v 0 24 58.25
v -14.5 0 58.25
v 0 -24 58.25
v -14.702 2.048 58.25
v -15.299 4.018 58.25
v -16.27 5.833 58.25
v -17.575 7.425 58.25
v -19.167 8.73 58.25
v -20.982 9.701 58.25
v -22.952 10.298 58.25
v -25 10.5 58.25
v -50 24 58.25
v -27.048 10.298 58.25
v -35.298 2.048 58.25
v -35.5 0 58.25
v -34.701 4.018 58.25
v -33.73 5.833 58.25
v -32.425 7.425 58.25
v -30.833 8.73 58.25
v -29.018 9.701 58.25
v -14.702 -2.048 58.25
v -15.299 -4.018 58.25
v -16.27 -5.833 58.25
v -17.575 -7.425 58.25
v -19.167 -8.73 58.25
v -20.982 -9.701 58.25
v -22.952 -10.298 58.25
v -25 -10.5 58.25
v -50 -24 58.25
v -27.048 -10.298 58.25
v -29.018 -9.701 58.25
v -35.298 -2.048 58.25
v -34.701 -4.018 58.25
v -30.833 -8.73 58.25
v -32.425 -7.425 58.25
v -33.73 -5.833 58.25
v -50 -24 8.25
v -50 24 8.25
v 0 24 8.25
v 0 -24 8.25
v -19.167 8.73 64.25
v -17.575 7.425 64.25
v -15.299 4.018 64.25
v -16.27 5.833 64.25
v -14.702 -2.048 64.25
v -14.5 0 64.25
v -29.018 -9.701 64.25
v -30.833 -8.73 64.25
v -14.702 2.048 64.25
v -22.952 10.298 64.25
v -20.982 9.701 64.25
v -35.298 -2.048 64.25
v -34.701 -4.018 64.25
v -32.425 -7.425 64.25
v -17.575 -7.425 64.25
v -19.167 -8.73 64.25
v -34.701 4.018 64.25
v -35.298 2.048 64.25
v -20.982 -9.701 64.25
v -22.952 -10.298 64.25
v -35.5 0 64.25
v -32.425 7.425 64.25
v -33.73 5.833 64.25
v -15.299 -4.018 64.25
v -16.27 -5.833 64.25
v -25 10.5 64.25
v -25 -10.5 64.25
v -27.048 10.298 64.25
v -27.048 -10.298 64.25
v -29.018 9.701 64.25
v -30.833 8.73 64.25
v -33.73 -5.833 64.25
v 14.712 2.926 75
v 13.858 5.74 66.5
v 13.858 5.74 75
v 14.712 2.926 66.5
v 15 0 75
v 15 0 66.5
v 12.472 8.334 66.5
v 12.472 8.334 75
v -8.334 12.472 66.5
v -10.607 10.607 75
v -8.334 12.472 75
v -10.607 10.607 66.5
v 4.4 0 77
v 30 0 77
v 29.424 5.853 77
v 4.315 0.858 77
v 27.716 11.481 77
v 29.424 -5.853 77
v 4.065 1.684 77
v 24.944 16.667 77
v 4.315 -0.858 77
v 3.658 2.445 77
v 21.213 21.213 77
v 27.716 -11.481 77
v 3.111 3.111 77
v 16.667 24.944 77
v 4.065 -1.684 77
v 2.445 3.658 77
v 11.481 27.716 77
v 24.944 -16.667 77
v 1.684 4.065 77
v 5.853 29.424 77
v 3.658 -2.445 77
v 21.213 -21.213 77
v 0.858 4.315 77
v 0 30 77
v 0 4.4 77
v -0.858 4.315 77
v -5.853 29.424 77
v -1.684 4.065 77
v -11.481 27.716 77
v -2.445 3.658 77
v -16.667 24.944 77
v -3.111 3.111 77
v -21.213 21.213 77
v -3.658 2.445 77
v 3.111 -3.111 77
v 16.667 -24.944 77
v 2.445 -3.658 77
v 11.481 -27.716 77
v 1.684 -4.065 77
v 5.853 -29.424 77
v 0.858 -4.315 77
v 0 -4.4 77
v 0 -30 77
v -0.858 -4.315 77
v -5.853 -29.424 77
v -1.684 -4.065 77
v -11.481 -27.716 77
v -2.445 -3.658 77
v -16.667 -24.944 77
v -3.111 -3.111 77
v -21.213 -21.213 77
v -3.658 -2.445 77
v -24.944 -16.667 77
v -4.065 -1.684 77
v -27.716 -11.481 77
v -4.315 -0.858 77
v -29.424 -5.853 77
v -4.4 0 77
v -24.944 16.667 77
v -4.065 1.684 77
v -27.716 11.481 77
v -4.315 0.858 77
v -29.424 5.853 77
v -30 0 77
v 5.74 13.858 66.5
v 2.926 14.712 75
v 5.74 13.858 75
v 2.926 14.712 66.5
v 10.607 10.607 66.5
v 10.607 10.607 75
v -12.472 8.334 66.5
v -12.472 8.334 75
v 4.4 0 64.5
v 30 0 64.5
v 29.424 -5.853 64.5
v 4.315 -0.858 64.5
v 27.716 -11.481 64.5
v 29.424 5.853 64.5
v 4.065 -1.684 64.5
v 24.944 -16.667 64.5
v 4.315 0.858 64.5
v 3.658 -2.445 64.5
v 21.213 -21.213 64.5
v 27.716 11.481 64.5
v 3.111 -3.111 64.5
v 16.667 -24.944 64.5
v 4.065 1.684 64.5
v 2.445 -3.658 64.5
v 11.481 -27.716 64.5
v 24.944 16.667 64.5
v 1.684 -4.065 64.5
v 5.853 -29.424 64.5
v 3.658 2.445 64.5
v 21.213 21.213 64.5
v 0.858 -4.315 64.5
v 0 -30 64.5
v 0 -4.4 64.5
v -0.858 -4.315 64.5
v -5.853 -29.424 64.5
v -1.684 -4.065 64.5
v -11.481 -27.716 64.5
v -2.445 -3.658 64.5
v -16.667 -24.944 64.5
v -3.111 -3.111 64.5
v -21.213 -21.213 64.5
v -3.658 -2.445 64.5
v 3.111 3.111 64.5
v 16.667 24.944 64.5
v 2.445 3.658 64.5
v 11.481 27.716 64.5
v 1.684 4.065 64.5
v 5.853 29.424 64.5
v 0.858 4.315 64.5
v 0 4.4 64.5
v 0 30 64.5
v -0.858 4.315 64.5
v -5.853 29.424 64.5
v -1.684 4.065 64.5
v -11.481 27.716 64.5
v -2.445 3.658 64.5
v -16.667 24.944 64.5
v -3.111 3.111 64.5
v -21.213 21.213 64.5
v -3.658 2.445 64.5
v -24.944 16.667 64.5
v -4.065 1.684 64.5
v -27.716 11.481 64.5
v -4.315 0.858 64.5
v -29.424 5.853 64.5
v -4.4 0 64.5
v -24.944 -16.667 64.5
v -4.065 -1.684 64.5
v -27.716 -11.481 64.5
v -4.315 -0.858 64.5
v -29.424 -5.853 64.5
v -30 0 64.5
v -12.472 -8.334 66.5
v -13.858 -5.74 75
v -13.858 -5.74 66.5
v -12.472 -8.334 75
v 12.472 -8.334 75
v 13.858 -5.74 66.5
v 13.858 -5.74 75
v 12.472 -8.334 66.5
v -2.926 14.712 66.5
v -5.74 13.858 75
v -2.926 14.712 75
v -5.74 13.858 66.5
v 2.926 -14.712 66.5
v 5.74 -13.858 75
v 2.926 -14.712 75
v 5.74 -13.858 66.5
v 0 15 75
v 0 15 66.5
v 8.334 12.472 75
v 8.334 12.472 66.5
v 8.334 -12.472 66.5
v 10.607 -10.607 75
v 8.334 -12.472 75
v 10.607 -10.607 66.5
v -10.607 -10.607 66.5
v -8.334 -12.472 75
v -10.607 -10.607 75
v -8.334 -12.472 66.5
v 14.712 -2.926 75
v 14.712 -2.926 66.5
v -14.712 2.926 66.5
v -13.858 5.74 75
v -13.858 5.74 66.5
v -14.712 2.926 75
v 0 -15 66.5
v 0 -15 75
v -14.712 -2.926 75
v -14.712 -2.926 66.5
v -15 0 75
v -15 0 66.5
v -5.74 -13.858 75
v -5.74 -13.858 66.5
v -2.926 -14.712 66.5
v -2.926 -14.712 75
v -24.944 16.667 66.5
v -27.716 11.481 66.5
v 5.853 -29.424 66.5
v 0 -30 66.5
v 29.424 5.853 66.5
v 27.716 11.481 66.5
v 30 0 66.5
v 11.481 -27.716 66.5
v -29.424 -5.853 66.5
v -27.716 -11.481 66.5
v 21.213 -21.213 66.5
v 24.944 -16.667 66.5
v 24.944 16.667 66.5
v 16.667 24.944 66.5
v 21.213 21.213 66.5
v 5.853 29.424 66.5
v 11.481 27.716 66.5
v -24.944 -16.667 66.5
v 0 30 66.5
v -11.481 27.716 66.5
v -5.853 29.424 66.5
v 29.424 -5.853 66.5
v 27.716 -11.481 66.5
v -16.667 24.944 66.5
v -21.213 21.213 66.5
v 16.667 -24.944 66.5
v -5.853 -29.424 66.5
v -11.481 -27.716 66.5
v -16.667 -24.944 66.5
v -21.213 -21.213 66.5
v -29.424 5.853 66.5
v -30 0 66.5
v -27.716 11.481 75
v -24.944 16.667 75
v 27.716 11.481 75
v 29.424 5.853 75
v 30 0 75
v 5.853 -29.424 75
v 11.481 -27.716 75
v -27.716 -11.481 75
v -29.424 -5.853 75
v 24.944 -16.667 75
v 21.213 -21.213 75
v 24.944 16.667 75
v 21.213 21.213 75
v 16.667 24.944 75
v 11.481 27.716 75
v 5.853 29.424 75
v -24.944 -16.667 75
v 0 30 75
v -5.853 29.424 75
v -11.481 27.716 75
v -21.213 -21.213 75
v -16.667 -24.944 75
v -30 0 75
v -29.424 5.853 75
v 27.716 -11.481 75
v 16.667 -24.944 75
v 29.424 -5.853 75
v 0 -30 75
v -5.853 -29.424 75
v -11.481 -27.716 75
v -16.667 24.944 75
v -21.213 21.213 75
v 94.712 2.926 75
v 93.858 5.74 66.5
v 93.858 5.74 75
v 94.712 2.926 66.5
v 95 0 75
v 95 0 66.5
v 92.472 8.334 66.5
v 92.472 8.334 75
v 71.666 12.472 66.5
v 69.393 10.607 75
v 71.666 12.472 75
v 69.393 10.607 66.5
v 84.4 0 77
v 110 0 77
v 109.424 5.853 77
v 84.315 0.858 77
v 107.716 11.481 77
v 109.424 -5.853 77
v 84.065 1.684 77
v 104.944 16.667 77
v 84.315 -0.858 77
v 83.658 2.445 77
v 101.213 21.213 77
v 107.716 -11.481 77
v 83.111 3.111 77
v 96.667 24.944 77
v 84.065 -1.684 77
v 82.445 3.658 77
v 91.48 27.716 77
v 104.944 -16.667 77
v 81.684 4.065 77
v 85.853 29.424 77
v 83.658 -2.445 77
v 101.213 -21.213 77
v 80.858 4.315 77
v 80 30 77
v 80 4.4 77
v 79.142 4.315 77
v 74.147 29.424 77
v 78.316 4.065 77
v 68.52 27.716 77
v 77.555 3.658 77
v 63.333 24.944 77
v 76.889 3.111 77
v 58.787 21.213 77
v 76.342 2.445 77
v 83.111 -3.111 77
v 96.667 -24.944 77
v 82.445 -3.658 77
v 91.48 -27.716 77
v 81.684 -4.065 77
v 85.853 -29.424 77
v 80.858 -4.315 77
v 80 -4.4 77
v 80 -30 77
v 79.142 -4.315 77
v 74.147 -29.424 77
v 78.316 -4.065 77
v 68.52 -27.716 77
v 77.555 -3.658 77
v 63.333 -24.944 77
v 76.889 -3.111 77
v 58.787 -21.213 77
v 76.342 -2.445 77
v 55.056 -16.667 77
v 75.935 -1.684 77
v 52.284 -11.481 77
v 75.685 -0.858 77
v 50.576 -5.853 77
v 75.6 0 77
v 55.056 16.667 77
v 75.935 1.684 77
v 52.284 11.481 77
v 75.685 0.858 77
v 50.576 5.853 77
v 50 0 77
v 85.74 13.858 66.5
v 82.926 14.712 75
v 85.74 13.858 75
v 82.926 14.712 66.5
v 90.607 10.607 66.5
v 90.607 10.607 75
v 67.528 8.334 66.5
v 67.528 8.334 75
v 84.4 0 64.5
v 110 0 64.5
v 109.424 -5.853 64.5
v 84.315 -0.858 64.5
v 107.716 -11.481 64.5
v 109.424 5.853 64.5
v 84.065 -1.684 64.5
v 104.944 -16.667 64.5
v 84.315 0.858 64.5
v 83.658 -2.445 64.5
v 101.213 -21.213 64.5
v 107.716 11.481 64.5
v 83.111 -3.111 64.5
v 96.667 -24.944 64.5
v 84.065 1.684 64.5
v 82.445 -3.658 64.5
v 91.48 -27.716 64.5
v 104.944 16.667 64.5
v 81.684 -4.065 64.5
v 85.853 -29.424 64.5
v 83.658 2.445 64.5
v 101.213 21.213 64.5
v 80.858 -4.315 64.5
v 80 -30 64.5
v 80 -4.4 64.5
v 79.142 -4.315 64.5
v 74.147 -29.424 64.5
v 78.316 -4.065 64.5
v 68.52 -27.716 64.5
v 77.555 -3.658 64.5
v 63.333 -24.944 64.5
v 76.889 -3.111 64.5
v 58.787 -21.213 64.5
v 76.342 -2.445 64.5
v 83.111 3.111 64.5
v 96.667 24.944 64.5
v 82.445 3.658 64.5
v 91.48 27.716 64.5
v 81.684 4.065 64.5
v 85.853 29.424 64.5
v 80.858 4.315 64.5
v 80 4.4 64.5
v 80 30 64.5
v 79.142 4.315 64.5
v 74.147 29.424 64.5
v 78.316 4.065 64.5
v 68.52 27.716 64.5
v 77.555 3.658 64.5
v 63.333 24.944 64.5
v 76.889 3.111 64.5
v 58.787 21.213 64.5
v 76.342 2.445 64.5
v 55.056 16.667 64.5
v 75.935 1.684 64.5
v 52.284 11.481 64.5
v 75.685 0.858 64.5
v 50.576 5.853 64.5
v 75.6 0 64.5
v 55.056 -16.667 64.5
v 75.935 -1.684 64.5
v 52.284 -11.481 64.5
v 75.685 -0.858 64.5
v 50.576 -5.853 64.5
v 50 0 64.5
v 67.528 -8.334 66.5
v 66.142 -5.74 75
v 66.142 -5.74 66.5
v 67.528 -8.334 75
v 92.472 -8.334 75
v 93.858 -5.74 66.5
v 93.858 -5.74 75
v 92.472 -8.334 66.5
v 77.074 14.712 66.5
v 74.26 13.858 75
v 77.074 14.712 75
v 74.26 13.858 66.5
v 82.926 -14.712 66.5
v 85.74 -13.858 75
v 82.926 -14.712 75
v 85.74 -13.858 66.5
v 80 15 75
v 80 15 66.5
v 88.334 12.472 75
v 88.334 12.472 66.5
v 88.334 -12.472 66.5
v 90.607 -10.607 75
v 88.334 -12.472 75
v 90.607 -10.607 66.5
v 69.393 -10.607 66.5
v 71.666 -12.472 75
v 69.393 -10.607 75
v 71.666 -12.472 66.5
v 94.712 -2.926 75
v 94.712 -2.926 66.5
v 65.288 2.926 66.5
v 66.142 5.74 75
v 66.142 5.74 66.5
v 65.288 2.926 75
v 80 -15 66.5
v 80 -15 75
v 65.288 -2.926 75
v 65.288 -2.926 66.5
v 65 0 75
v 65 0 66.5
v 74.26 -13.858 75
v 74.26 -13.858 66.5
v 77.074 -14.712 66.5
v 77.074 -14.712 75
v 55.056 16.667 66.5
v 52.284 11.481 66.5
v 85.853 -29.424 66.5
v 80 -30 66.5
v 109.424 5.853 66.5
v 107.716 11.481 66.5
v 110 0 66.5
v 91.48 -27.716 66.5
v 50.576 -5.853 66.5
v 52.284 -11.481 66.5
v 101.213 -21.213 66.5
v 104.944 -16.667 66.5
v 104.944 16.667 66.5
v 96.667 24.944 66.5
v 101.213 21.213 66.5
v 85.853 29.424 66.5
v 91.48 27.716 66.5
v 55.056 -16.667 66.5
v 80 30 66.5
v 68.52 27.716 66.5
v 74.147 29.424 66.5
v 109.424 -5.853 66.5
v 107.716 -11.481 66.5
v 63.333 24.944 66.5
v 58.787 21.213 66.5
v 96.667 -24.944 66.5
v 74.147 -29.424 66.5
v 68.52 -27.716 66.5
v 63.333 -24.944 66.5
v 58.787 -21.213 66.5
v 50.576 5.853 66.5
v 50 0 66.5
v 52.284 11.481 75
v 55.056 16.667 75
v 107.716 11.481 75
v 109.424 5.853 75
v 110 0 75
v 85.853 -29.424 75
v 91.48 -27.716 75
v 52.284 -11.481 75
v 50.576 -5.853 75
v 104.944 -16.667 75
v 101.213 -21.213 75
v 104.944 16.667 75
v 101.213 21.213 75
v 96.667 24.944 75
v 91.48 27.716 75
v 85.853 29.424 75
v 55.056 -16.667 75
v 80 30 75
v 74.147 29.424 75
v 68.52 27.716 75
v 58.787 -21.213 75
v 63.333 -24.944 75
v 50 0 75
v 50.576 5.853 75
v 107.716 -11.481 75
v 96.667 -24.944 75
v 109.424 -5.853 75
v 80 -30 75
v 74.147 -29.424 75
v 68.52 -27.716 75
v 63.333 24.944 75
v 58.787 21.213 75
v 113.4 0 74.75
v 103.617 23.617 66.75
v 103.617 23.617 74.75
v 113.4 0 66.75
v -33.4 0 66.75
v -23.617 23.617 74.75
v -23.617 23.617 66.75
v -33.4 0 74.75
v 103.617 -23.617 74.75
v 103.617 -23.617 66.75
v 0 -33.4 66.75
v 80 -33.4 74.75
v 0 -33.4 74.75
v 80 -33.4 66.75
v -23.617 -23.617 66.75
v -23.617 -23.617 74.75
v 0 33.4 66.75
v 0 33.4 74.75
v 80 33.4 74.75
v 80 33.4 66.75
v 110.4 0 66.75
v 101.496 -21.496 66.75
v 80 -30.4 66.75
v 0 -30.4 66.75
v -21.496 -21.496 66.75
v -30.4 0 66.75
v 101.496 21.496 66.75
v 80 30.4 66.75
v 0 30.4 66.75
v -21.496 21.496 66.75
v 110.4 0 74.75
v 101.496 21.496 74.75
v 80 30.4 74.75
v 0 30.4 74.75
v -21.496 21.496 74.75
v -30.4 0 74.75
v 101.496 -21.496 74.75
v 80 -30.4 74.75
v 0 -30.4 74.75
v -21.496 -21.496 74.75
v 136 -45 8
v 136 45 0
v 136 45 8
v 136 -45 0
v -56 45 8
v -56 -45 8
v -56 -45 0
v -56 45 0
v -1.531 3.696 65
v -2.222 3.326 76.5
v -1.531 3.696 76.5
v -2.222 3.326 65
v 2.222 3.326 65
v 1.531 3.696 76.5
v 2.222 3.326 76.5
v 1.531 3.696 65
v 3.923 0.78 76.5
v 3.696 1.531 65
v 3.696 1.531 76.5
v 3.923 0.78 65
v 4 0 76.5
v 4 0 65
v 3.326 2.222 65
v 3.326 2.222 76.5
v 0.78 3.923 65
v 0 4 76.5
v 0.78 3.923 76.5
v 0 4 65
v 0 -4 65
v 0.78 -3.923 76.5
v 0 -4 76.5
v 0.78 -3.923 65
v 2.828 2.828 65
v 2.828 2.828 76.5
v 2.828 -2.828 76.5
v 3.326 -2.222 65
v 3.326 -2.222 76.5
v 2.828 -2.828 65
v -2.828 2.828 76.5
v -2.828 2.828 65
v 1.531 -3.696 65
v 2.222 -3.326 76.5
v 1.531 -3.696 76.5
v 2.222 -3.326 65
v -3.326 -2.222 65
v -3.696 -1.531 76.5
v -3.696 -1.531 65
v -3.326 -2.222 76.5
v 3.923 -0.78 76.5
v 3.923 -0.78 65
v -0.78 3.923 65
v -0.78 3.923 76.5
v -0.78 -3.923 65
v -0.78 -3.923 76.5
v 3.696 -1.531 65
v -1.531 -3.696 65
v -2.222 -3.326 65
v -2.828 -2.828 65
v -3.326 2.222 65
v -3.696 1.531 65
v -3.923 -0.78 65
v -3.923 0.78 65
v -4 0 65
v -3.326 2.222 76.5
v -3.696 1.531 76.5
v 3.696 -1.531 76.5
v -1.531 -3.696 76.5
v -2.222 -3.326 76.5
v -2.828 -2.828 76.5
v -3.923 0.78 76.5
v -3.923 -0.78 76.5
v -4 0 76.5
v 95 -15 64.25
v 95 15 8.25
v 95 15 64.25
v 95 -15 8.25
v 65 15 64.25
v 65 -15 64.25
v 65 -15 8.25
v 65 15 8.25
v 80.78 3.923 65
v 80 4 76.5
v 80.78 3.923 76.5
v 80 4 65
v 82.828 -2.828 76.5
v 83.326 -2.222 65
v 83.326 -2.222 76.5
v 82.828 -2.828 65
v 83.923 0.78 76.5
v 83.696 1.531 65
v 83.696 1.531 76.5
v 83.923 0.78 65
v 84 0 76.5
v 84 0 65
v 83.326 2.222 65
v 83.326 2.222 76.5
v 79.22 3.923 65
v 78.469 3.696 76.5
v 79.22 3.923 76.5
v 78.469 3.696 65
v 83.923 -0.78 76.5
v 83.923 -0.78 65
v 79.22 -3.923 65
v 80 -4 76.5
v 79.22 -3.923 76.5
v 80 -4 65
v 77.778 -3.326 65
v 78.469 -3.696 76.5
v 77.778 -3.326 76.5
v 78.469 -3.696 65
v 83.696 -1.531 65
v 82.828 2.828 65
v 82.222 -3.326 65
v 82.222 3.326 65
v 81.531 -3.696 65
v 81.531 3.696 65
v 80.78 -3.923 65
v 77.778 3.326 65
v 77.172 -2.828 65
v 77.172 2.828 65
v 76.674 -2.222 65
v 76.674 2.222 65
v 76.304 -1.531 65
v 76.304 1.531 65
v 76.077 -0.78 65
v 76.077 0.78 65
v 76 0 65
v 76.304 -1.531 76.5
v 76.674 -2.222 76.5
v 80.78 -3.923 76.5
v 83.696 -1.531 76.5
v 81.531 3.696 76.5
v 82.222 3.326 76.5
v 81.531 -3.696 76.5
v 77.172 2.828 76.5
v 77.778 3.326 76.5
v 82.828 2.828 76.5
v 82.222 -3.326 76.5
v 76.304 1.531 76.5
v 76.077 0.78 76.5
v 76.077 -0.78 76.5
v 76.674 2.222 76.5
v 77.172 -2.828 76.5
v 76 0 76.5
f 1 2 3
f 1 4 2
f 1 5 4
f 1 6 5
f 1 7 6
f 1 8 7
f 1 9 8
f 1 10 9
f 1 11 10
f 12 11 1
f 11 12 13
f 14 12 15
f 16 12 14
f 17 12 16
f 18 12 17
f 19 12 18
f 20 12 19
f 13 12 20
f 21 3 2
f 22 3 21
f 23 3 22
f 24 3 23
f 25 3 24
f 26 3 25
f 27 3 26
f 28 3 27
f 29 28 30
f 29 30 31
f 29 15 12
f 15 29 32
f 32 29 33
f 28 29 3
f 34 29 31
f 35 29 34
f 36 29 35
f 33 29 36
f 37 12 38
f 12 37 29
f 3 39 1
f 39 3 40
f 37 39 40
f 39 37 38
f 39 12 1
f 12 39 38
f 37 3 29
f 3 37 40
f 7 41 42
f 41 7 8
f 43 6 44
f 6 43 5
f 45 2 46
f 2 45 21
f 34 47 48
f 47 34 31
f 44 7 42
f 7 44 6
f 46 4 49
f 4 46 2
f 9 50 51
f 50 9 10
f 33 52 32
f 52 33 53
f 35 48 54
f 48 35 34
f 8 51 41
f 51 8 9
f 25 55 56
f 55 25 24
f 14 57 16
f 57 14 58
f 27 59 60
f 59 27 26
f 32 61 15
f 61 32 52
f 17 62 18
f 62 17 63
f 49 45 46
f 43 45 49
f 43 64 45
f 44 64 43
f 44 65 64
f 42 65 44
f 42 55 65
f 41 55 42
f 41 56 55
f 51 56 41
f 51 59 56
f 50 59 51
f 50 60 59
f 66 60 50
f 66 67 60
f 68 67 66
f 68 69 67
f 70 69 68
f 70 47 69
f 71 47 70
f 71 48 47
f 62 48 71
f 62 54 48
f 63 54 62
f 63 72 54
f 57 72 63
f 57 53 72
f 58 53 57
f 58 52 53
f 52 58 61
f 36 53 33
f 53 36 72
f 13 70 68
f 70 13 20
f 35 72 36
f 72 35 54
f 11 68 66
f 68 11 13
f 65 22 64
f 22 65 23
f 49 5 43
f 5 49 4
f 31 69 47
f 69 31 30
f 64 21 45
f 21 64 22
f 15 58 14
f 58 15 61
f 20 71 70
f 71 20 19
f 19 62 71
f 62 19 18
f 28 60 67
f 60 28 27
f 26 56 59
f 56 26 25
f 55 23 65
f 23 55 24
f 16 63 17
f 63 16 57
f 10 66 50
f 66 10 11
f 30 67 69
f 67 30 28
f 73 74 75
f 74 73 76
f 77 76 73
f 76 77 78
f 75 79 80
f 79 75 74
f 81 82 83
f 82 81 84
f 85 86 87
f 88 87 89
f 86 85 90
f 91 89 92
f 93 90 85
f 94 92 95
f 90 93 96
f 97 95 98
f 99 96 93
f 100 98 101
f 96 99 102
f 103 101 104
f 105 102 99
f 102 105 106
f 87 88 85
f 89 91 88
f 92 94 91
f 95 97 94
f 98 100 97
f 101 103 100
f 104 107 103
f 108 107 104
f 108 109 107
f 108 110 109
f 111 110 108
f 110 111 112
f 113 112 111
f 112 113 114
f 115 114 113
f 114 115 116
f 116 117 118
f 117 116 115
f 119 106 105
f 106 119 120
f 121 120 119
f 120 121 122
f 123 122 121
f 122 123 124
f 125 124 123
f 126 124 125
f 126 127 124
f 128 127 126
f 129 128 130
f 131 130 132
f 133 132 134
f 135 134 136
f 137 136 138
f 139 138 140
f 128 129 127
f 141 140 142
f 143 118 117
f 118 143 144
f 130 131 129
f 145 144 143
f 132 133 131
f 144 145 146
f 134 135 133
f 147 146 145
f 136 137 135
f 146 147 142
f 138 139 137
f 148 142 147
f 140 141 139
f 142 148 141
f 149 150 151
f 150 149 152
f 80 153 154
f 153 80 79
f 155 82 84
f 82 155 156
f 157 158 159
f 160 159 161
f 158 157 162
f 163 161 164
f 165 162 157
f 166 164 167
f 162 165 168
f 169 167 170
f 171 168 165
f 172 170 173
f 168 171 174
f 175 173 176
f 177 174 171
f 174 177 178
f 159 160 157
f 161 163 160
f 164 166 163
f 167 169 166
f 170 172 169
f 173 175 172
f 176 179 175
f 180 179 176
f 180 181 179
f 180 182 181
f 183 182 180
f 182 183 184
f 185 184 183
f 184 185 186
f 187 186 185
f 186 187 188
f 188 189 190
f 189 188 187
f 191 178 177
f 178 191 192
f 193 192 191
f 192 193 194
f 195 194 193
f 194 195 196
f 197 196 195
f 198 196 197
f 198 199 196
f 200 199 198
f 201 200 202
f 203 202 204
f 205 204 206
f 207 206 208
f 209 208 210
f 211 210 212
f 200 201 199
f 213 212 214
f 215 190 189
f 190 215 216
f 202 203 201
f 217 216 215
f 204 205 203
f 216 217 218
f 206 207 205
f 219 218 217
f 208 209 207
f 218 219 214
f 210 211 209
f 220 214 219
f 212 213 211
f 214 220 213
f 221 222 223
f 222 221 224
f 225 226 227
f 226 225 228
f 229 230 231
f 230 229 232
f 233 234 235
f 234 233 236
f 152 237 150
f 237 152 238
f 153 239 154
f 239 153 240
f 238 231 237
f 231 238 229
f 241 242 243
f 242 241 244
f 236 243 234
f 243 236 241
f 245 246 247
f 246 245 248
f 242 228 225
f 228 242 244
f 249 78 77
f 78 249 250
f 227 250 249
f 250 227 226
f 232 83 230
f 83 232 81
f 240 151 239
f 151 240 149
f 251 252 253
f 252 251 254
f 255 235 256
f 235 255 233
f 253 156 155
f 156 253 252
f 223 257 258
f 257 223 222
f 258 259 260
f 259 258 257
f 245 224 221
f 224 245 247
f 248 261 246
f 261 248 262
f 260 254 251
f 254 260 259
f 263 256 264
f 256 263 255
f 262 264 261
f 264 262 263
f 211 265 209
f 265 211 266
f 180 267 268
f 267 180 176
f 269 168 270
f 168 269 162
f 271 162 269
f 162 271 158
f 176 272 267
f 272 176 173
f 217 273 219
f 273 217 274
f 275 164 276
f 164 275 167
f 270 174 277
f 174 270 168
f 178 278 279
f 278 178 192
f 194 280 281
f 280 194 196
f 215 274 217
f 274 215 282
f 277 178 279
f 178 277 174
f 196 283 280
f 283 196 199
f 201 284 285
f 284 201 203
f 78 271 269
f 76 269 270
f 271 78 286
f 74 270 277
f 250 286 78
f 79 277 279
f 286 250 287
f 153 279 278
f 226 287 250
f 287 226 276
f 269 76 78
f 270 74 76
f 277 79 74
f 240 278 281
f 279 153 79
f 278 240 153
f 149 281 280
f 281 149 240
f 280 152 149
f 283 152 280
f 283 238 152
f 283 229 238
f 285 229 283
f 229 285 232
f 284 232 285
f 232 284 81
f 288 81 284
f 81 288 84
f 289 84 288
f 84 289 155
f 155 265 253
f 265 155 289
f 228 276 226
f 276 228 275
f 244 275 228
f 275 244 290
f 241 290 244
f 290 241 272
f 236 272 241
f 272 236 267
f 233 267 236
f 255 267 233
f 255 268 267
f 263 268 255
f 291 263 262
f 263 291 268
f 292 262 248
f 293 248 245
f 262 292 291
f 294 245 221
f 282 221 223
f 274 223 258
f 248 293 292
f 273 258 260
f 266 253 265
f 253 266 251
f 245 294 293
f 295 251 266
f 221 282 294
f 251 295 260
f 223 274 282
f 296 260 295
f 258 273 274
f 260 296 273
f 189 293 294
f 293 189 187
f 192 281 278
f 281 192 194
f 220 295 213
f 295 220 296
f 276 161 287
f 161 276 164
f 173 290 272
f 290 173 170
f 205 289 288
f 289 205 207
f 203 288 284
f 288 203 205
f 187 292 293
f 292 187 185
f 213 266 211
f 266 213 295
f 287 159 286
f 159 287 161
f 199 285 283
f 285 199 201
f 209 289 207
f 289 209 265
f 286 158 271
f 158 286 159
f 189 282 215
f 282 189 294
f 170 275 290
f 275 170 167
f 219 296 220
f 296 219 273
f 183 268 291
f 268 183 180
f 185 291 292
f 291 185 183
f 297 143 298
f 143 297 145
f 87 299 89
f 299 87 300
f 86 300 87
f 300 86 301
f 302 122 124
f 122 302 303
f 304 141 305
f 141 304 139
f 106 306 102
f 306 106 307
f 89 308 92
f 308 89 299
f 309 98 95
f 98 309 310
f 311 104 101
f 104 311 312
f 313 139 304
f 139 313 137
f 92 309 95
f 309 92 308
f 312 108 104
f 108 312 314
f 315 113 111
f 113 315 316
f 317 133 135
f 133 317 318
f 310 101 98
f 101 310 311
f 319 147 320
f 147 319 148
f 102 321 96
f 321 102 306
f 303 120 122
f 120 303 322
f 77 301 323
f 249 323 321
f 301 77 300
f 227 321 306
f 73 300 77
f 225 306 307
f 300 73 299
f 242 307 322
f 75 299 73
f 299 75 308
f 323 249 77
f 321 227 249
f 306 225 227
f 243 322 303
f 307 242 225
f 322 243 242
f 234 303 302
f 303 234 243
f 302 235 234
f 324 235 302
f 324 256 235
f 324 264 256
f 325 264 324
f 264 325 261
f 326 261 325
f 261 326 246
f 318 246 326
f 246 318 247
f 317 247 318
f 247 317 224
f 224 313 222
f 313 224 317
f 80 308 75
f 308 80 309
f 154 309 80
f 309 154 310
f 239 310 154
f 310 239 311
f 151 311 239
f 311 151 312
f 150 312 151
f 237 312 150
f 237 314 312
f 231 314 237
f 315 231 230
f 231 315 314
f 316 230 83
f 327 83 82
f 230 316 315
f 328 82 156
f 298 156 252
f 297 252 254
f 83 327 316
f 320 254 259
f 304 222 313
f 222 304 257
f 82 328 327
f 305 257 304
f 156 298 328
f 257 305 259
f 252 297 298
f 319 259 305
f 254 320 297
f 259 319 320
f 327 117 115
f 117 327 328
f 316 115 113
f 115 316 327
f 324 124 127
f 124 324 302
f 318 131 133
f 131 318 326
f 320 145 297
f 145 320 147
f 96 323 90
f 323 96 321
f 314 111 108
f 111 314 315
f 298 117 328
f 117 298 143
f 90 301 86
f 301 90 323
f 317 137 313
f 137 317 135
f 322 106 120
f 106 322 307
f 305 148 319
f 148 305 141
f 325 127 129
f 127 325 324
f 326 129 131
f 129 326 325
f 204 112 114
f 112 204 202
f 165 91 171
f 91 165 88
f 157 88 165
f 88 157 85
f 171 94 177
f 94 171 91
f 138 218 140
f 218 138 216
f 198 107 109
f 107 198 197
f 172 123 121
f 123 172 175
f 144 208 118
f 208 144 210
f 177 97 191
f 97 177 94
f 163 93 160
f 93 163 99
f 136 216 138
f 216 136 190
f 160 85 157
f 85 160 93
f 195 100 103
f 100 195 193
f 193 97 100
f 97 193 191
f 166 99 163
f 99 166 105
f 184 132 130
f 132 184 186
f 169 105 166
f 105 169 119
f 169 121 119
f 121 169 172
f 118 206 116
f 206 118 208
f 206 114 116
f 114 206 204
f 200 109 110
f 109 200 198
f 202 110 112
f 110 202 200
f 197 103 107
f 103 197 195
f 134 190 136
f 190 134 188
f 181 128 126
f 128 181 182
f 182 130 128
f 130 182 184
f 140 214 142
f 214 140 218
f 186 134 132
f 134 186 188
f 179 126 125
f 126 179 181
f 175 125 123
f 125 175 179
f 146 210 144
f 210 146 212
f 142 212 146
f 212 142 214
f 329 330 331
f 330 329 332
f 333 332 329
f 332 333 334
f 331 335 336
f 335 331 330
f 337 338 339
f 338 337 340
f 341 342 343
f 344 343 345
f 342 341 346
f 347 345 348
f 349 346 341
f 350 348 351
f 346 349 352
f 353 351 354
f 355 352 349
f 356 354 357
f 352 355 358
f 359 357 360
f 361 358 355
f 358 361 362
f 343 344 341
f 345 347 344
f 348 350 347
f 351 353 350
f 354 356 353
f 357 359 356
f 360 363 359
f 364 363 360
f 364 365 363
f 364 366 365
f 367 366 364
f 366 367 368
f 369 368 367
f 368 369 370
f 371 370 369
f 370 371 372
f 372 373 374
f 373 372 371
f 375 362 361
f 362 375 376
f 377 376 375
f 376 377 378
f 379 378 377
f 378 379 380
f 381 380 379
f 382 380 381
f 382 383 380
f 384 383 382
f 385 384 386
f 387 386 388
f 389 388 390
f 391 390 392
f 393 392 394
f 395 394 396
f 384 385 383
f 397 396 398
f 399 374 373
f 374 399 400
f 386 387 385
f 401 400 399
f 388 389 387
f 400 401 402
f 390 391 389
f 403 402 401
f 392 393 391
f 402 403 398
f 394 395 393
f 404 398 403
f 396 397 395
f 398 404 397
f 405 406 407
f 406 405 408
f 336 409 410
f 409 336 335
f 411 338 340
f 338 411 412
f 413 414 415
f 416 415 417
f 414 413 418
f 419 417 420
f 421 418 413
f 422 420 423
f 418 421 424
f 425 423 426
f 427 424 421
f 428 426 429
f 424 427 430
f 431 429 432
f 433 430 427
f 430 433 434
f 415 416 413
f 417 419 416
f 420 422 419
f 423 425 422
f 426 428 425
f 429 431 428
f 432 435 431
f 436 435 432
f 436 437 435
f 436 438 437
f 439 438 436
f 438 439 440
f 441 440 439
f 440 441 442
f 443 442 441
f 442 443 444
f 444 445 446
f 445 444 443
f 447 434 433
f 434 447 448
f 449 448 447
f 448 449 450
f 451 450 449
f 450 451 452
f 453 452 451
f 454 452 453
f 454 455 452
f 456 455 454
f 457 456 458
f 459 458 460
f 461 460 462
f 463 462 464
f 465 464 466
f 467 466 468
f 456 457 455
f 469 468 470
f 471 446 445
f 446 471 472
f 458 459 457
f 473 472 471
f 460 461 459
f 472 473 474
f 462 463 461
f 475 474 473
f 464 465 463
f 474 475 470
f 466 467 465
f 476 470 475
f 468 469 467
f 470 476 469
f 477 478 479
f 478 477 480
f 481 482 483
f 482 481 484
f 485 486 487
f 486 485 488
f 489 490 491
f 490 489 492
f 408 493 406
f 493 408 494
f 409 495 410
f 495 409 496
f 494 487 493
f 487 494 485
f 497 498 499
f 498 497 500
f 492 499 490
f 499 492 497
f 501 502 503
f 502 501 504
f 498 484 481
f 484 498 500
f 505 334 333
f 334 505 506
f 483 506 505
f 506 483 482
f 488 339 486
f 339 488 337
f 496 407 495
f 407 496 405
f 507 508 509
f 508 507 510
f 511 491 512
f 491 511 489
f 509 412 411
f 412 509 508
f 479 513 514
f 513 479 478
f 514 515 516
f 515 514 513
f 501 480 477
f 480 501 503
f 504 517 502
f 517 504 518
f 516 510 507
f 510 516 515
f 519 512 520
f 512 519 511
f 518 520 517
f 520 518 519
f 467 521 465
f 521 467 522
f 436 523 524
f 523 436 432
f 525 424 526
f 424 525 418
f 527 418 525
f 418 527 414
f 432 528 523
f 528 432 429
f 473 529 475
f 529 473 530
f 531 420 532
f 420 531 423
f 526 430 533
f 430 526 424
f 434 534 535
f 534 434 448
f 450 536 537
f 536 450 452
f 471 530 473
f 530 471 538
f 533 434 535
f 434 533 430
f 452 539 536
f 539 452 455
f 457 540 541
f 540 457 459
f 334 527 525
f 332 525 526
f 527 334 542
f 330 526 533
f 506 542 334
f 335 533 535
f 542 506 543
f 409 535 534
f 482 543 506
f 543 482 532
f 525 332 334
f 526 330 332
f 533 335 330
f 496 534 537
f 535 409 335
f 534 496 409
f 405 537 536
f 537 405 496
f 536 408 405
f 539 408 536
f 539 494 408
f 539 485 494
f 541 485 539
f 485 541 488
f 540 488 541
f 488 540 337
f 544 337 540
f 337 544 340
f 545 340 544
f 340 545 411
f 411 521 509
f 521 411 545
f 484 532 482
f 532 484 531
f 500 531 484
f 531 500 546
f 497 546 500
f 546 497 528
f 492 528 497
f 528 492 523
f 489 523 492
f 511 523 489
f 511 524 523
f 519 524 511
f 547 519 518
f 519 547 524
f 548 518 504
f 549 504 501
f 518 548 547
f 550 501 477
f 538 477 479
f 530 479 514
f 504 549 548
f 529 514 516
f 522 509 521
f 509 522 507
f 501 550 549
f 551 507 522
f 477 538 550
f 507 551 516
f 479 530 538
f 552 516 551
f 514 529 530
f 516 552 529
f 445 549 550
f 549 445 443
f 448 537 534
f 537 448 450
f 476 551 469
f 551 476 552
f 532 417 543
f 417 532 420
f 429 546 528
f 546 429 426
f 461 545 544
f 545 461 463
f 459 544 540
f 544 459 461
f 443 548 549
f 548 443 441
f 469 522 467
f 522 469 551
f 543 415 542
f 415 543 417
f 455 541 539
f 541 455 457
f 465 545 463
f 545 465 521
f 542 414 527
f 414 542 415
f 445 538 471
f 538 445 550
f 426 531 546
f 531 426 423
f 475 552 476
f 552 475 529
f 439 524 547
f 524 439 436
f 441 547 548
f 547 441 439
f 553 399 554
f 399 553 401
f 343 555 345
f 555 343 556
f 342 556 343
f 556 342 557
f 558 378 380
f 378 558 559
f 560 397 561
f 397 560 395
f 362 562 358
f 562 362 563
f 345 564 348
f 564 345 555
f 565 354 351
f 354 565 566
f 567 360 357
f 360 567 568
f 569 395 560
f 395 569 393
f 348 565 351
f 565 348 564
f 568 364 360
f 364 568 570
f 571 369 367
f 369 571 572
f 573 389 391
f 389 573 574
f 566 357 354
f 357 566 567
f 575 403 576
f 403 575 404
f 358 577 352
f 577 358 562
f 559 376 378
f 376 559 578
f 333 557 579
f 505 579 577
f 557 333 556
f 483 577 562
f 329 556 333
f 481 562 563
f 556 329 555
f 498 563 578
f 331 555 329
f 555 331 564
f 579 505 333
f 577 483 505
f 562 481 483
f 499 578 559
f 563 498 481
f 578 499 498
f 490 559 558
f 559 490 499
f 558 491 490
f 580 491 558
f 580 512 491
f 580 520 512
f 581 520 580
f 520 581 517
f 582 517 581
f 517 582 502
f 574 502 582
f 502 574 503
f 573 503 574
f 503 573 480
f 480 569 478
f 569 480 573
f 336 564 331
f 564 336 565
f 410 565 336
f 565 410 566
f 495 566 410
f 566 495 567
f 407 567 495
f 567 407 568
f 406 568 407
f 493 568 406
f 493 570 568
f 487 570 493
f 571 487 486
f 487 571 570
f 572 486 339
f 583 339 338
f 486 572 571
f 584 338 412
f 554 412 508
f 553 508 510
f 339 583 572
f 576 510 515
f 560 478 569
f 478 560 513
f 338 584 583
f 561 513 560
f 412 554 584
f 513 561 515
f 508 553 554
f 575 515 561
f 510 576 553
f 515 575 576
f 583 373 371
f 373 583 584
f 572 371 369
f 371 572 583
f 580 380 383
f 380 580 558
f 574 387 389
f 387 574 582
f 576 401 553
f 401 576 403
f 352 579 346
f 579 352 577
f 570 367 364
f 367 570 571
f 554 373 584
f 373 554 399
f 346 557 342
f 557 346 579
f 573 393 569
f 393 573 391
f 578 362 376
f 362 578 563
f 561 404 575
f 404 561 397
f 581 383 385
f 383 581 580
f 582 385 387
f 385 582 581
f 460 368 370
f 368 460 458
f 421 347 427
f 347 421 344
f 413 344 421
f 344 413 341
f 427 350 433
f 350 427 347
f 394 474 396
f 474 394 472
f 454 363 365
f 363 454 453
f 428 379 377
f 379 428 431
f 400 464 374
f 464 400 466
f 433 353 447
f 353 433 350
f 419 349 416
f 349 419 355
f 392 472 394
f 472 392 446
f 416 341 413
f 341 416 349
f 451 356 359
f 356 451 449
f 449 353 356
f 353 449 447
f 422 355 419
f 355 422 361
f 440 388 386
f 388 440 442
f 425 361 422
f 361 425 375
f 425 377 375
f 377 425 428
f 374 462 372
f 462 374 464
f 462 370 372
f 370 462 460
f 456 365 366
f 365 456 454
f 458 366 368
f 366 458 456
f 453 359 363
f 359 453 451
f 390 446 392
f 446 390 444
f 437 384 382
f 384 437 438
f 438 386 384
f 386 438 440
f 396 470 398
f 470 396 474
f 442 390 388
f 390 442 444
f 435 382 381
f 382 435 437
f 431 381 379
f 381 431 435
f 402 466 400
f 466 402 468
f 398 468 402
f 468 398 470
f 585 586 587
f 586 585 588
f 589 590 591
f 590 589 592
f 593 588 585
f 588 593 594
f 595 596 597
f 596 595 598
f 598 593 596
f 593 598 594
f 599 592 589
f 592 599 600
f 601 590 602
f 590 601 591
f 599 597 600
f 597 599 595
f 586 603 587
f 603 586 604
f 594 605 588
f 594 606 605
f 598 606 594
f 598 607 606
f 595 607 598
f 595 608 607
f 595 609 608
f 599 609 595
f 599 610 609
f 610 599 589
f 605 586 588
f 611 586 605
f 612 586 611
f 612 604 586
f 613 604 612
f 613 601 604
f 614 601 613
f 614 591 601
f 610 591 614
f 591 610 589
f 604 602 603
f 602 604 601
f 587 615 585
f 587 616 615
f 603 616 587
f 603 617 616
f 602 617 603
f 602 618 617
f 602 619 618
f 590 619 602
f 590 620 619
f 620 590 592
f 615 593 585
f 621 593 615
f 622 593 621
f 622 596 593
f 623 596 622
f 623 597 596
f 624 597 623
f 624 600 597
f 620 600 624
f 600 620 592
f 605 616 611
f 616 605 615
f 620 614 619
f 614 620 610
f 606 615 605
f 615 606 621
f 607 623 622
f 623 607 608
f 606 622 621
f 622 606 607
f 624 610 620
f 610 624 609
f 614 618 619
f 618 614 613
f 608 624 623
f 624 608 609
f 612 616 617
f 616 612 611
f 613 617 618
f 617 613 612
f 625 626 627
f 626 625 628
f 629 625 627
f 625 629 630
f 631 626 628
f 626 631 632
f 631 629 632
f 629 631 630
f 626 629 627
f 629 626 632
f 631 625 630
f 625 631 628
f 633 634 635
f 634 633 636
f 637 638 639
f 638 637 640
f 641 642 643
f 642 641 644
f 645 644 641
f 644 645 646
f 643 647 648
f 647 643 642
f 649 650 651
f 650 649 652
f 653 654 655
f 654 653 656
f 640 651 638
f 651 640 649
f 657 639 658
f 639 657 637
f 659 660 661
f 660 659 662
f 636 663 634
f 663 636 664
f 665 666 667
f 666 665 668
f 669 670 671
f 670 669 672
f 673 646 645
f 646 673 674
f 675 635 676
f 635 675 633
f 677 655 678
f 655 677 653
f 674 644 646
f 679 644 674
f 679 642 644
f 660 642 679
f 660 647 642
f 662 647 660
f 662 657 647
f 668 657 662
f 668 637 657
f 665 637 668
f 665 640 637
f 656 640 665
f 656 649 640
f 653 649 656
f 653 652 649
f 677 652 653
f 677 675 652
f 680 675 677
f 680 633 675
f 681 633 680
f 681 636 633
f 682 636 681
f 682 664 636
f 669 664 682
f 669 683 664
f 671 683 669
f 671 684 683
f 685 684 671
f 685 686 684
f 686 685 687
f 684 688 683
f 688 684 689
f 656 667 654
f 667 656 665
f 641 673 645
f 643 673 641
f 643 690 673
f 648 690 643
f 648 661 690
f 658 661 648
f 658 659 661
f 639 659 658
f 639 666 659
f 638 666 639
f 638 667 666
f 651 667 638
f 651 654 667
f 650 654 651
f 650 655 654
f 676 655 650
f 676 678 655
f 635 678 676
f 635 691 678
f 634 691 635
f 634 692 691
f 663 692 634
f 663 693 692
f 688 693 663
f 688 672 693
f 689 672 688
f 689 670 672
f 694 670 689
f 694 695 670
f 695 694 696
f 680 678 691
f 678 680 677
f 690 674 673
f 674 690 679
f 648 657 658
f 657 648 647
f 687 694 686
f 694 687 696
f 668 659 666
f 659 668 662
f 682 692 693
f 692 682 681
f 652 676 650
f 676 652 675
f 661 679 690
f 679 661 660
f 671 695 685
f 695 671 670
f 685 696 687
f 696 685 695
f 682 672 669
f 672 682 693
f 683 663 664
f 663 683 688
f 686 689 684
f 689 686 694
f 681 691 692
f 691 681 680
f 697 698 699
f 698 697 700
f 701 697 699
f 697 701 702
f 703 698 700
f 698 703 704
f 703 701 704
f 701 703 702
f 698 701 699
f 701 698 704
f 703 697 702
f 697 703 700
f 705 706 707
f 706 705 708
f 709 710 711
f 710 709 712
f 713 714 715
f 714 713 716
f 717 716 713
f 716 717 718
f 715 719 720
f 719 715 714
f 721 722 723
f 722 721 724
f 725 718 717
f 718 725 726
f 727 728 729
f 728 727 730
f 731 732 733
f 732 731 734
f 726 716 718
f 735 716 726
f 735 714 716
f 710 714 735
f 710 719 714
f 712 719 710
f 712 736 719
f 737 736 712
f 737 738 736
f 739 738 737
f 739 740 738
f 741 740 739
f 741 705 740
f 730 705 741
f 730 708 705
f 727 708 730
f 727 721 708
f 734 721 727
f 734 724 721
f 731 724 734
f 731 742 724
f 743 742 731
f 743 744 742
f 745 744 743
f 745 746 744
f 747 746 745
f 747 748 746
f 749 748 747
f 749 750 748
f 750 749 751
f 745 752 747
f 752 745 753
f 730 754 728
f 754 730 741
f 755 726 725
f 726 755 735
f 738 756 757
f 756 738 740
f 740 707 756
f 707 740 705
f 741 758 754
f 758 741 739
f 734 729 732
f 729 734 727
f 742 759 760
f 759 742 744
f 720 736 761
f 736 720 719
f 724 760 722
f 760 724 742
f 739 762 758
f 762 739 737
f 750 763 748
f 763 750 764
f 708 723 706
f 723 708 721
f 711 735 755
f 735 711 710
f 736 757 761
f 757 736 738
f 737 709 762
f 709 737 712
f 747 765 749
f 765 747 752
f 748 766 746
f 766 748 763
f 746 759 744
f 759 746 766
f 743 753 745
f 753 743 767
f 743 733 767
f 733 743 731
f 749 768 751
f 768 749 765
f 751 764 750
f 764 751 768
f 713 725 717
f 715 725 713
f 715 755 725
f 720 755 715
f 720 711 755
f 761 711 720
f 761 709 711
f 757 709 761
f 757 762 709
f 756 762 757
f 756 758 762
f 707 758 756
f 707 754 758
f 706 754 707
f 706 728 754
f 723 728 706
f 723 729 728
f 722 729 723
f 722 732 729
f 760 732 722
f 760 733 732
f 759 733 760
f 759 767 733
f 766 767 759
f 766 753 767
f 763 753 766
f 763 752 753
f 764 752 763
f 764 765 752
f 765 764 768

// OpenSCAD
$fn = 32;

// ------------------------------------------------------------------------
// Motor belt drive: span 80 mm, pulleys d60, belt 8 mm wide
// Every part is its own module, assembly() places every instance.
// ------------------------------------------------------------------------

// --- part 1 ---
module base_plate() {
  difference() {
    translate([-96, -45, 0]) cube([192, 90, 8]);
  }
}

// --- part 2 ---
module motor() {
  union() {
    translate([-25, -24, 0]) cube([50, 48, 50]);
    translate([28, 0, 25]) rotate([0, 90, 0]) cylinder(h = 6, d = 21, center = true);
  }
}

// --- part 3 ---
module drive_shaft() {
  translate([0, 0, -5.75]) cylinder(h = 11.5, d = 8);
}

// --- part 4 ---
module pulley_drive() {
  difference() {
    union() {
      cylinder(h = 12.5, d = 30);
      cylinder(h = 2, d = 60);
      translate([0, 0, 10.5]) cylinder(h = 2, d = 60);
    }
    translate([0, 0, -1]) cylinder(h = 14.5, d = 8.8);
  }
}

// --- part 5 ---
module idler_post() {
  translate([-15, -15, 0]) cube([30, 30, 56]);
}

// --- part 6 ---
module driven_shaft() {
  translate([0, 0, -5.75]) cylinder(h = 11.5, d = 8);
}

// --- part 7 ---
module pulley_driven() {
  difference() {
    union() {
      cylinder(h = 12.5, d = 30);
      cylinder(h = 2, d = 60);
      translate([0, 0, 10.5]) cylinder(h = 2, d = 60);
    }
    translate([0, 0, -1]) cylinder(h = 14.5, d = 8.8);
  }
}

// --- part 8 ---
module drive_belt() {
  difference() {
    linear_extrude(height = 8) polygon(points = concat([for (a = [90 : 45 : 270]) [33.4 * cos(a), 33.4 * sin(a)]], [for (a = [270 : 45 : 450]) [80 + 33.4 * cos(a), 33.4 * sin(a)]]));
    translate([0, 0, -1]) linear_extrude(height = 10) polygon(points = concat([for (a = [90 : 45 : 270]) [30.4 * cos(a), 30.4 * sin(a)]], [for (a = [270 : 45 : 450]) [80 + 30.4 * cos(a), 30.4 * sin(a)]]));
  }
}

// --- assembly ---
module assembly() {
  color([0.80, 0.24, 0.20]) translate([40, 0, 0]) rotate([0, 0, 0]) base_plate();
  color([0.20, 0.45, 0.75]) translate([0, 0, 33.25]) rotate([0, 270, 0]) motor();
  color([0.25, 0.62, 0.32]) translate([0, 0, 70.75]) rotate([0, 0, 0]) drive_shaft();
  color([0.92, 0.70, 0.18]) translate([0, 0, 64.5]) rotate([0, 0, 0]) pulley_drive();
  color([0.58, 0.35, 0.70]) translate([80, 0, 8.25]) rotate([0, 0, 0]) idler_post();
  color([0.16, 0.66, 0.66]) translate([80, 0, 70.75]) rotate([0, 0, 0]) driven_shaft();
  color([0.85, 0.48, 0.18]) translate([80, 0, 64.5]) rotate([0, 0, 0]) pulley_driven();
  color([0.55, 0.60, 0.65]) translate([0, 0, 66.75]) rotate([0, 0, 0]) drive_belt();
}

assembly();
